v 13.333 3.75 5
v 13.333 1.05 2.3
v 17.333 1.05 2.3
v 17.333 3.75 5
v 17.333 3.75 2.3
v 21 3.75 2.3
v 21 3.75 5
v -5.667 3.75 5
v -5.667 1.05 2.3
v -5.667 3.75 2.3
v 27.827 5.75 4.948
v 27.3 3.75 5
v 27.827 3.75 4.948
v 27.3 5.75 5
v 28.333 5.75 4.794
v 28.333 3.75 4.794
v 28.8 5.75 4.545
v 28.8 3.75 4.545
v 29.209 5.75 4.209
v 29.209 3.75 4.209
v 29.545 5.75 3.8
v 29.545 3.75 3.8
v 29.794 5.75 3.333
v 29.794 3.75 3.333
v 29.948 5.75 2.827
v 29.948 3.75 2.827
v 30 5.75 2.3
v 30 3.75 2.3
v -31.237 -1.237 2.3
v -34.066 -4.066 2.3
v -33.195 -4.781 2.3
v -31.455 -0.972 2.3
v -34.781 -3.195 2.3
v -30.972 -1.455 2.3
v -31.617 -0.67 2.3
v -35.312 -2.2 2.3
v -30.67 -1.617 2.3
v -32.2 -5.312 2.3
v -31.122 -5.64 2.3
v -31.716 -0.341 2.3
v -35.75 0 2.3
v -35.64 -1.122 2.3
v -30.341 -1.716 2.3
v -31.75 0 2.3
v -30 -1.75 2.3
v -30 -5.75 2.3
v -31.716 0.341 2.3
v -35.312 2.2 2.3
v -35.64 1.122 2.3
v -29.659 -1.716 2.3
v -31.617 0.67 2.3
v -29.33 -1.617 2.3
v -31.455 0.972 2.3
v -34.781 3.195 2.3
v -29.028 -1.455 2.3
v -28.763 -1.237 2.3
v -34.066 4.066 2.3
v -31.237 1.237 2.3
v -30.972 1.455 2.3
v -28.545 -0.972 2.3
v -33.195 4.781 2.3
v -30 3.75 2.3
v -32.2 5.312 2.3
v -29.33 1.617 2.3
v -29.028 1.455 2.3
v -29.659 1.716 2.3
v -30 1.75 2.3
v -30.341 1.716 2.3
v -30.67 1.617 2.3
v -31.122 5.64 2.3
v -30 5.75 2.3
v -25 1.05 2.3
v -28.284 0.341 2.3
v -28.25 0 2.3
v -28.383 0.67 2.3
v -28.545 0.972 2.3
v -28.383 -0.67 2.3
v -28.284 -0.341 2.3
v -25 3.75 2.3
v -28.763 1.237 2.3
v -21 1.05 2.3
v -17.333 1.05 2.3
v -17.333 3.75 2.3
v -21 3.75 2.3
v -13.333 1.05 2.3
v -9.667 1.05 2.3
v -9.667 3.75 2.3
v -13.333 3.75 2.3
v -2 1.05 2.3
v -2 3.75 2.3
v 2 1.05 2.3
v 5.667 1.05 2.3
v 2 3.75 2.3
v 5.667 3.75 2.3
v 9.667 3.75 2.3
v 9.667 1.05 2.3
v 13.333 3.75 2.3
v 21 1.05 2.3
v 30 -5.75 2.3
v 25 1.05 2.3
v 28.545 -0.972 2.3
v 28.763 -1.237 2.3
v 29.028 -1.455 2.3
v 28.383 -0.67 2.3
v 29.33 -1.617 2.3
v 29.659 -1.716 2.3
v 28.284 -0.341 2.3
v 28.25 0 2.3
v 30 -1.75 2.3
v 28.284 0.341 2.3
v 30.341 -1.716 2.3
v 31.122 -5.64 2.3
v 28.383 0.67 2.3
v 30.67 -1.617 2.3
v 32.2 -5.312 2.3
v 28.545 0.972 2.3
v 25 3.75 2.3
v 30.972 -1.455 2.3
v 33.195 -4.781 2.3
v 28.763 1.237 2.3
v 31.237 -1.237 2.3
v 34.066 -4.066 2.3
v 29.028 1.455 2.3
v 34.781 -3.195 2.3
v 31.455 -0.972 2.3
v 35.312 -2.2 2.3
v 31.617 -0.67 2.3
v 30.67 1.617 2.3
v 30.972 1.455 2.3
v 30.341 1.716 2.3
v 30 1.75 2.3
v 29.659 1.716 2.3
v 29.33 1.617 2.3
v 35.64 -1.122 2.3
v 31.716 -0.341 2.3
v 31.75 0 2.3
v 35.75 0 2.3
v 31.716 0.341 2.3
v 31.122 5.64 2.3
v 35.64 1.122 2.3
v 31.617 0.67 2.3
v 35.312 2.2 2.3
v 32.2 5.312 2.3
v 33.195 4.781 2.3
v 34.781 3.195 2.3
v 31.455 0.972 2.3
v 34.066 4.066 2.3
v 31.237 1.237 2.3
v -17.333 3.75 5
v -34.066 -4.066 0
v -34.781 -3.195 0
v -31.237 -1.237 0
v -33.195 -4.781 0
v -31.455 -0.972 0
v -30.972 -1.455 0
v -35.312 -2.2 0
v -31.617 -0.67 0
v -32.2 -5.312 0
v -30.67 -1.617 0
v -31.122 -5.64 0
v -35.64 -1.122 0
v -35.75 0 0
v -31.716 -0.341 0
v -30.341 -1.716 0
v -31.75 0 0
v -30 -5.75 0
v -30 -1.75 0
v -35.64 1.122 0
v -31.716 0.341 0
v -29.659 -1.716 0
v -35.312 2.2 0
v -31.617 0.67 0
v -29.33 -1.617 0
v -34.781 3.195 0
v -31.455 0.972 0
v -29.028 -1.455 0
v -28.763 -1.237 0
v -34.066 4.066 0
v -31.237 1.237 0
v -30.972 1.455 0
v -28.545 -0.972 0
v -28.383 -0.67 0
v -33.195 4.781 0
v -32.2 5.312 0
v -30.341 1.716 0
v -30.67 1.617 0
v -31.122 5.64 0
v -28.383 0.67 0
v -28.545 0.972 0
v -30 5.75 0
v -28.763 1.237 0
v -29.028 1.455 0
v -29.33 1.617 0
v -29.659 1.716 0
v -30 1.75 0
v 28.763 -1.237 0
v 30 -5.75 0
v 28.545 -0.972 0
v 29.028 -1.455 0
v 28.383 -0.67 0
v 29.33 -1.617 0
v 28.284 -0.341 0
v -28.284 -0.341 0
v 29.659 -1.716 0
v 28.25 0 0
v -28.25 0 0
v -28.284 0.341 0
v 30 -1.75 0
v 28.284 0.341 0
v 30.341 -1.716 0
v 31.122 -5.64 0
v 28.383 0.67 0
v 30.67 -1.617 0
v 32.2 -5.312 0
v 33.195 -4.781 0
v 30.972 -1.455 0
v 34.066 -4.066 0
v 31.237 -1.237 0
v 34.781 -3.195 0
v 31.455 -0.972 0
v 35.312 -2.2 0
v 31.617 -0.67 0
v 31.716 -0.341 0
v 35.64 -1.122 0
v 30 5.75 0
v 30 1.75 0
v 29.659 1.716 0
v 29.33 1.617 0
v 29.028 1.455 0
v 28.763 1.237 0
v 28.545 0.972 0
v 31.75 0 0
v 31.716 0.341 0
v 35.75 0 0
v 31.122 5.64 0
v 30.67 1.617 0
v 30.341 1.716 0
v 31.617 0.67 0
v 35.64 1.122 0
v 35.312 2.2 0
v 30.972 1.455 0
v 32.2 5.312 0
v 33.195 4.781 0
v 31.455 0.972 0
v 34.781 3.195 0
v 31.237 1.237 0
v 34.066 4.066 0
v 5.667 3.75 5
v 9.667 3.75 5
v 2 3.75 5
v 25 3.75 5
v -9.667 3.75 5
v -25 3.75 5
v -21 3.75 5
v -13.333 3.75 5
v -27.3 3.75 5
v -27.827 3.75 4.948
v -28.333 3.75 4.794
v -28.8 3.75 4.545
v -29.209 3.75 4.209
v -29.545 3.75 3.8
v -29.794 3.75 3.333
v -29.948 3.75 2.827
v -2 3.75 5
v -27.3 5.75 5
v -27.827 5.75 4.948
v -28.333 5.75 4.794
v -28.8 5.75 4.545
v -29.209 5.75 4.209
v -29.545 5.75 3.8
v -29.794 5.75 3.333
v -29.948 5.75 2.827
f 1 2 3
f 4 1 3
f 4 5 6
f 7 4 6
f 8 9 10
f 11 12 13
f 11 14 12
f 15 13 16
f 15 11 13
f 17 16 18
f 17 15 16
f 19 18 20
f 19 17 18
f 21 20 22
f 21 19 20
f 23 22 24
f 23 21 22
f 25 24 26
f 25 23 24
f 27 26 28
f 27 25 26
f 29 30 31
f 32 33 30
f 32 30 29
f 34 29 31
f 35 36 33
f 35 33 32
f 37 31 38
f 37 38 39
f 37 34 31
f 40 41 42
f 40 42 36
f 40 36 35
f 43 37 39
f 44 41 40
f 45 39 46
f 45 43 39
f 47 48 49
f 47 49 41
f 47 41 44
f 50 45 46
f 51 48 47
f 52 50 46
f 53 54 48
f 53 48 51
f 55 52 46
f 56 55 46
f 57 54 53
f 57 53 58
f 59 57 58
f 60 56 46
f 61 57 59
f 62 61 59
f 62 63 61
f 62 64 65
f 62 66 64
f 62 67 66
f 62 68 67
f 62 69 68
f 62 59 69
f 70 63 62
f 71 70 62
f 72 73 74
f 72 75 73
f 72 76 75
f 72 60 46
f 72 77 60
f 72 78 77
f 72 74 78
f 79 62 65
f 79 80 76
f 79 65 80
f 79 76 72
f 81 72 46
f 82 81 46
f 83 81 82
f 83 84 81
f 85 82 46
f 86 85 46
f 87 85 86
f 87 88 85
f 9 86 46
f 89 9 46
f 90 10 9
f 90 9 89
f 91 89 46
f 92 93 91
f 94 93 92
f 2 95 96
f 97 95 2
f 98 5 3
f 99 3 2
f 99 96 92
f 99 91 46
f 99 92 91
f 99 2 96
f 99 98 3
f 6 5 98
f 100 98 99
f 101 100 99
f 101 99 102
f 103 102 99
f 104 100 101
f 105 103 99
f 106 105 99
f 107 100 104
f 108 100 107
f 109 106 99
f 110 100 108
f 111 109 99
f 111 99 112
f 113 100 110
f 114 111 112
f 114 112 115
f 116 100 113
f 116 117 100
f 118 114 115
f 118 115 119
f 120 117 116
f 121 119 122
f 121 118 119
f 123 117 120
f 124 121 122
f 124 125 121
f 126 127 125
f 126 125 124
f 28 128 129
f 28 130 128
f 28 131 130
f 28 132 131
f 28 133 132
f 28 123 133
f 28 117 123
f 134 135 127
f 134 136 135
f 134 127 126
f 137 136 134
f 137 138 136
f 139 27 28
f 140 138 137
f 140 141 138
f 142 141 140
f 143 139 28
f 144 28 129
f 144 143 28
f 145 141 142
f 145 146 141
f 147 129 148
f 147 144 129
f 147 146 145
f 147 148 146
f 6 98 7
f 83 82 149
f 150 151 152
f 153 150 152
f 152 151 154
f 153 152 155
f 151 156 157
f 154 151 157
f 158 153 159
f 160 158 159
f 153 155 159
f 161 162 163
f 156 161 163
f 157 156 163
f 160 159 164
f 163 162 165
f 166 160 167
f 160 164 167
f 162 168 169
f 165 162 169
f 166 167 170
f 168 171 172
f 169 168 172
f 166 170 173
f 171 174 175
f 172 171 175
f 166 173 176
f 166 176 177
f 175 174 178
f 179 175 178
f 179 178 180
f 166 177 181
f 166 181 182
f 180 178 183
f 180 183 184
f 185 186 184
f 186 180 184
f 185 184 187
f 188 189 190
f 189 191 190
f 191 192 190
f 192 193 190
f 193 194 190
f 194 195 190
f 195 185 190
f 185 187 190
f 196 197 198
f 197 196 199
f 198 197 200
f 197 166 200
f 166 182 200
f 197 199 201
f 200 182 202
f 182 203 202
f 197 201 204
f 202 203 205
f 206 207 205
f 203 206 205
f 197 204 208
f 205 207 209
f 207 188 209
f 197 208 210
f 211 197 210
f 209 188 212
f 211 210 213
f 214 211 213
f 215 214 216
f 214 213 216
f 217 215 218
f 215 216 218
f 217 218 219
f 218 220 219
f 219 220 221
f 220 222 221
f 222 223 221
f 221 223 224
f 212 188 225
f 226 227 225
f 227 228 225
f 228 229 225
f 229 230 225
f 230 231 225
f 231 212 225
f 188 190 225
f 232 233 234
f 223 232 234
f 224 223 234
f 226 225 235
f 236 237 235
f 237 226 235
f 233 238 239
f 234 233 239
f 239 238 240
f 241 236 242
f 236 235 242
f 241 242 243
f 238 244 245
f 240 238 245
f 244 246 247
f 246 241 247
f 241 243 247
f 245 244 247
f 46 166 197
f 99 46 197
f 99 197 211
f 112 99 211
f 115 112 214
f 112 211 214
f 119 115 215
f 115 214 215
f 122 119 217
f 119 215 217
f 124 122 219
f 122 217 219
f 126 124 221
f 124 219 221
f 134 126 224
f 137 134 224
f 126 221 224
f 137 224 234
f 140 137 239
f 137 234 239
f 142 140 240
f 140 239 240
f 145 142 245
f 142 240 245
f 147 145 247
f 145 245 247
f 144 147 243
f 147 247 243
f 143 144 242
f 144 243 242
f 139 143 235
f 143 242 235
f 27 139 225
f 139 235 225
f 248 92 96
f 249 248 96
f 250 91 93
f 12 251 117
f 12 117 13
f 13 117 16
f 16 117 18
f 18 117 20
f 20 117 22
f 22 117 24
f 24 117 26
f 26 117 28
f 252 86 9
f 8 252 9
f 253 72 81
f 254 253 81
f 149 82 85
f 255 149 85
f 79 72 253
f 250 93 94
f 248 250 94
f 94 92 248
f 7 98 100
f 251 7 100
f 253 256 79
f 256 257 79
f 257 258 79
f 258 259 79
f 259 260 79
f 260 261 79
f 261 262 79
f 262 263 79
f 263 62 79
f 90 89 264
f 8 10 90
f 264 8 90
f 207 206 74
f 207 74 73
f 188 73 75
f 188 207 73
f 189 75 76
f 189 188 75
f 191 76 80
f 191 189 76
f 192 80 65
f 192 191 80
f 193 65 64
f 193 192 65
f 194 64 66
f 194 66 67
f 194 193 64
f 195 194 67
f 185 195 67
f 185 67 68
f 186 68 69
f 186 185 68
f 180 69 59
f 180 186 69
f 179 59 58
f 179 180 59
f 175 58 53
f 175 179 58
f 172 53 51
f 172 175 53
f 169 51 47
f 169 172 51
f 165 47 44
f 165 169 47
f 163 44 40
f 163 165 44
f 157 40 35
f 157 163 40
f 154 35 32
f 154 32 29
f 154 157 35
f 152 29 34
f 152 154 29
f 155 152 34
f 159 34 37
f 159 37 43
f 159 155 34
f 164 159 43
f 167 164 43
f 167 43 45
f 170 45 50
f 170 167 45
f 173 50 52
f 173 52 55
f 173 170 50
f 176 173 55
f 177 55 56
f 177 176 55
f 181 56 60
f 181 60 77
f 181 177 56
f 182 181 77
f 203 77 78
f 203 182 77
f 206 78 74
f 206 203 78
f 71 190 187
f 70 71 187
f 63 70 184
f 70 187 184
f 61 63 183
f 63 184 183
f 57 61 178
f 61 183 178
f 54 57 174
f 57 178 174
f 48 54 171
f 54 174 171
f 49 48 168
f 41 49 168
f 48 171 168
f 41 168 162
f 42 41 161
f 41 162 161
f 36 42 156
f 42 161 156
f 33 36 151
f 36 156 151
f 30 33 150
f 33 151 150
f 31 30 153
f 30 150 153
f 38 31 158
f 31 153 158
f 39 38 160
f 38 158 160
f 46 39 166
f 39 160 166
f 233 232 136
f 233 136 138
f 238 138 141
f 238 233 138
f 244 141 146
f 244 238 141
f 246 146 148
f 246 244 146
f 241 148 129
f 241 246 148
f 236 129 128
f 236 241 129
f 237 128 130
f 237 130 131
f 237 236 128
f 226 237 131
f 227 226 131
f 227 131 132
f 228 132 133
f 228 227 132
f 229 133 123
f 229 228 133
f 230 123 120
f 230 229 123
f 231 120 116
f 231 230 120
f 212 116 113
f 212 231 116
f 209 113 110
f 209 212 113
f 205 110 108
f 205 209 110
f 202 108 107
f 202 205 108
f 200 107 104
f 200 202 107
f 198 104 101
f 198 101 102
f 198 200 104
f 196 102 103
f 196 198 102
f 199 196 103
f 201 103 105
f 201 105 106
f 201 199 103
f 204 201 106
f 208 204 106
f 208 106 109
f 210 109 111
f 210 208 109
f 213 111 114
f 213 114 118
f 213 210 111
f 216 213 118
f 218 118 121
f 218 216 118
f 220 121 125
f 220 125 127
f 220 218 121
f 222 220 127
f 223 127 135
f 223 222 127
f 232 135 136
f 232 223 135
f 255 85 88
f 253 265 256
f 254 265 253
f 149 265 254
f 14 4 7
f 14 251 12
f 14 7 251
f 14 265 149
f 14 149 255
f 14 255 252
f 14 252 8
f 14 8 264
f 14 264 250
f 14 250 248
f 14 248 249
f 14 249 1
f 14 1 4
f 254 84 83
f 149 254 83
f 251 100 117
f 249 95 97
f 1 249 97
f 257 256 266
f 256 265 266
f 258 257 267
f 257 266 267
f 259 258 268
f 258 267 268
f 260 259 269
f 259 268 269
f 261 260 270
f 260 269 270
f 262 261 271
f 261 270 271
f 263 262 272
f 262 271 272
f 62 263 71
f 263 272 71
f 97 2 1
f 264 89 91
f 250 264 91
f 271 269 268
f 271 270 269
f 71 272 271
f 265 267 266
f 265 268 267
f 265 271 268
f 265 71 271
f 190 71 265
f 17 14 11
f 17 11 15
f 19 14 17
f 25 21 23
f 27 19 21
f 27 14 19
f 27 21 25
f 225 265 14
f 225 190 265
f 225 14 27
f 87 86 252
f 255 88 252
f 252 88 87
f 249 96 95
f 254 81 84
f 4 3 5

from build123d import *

# Parameters (mm, degrees)
F0_R     = 1.75
F1_DEPTH = 2.3
F0_W     = 60
F0_H     = 2
F2_DEPTH = 5
F3_W     = 4
F3_H     = 2.7
F4_DEPTH = 2.7
F5_SIZE  = 2.69999
F6_R     = 2.69999


# Not quite as in the source:
# - a fillet or chamfer is up to 0.001 mm smaller than in the source, because OpenCascade refuses the exact size


with BuildPart() as f1:
    # F0 (on Top) → F1 (new body)
    with BuildSketch(Plane.XY):
        with BuildLine():
            Line((-30, 3.75), (-30, 5.75))
            ThreePointArc((-30, 5.75), (-35.75, 0), (-30, -5.75))
            Line((-30, -5.75), (30, -5.75))
            ThreePointArc((30, -5.75), (35.75, 0), (30, 5.75))
            Line((30, 5.75), (30, 3.75))
            Line((30, 3.75), (-30, 3.75))
        make_face()
        with Locations((-30, 0)):
            Circle(F0_R, mode=Mode.SUBTRACT)
        with Locations((30, 0)):
            Circle(F0_R, mode=Mode.SUBTRACT)
    extrude(amount=F1_DEPTH)

    # F0 (on Top) → F2 (join)
    with BuildSketch(Plane.XY):
        with Locations((0, 4.75)):
            Rectangle(F0_W, F0_H)
    extrude(amount=F2_DEPTH)

    # F3 (on face) → F4 (join, through all)
    with BuildSketch(Plane.XY.offset(2.3)):
        with Locations((-23, 2.4)):
            Rectangle(F3_W, F3_H)
        with Locations((-15.3333333333, 2.4)):
            Rectangle(F3_W, F3_H)
        with Locations((-7.6666666667, 2.4)):
            Rectangle(F3_W, F3_H)
        with Locations((0, 2.4)):
            Rectangle(F3_W, F3_H)
        with Locations((7.6666666667, 2.4)):
            Rectangle(F3_W, F3_H)
        with Locations((15.3333333333, 2.4)):
            Rectangle(F3_W, F3_H)
        with Locations((23, 2.4)):
            Rectangle(F3_W, F3_H)
    extrude(amount=F4_DEPTH)

    # F5 (size 2.7 in the source; OpenCascade refuses exactly that, so slightly less here)
    f5_edges = [f1.edges().sort_by_distance(p)[0] for p in [
        (-23, 1.05, 5),
        (-15.333333, 1.05, 5),
        (-7.666667, 1.05, 5),
        (0, 1.05, 5),
        (7.666667, 1.05, 5),
        (15.333333, 1.05, 5),
        (23, 1.05, 5),
    ]]
    chamfer(f5_edges, length=F5_SIZE)

    # F6 (radius 2.7 in the source; OpenCascade refuses exactly that, so slightly less here)
    f6_edges = [f1.edges().sort_by_distance(p)[0] for p in [
        (30, 4.75, 5),
        (-30, 4.75, 5),
    ]]
    fillet(f6_edges, radius=F6_R)


solid = f1.part
